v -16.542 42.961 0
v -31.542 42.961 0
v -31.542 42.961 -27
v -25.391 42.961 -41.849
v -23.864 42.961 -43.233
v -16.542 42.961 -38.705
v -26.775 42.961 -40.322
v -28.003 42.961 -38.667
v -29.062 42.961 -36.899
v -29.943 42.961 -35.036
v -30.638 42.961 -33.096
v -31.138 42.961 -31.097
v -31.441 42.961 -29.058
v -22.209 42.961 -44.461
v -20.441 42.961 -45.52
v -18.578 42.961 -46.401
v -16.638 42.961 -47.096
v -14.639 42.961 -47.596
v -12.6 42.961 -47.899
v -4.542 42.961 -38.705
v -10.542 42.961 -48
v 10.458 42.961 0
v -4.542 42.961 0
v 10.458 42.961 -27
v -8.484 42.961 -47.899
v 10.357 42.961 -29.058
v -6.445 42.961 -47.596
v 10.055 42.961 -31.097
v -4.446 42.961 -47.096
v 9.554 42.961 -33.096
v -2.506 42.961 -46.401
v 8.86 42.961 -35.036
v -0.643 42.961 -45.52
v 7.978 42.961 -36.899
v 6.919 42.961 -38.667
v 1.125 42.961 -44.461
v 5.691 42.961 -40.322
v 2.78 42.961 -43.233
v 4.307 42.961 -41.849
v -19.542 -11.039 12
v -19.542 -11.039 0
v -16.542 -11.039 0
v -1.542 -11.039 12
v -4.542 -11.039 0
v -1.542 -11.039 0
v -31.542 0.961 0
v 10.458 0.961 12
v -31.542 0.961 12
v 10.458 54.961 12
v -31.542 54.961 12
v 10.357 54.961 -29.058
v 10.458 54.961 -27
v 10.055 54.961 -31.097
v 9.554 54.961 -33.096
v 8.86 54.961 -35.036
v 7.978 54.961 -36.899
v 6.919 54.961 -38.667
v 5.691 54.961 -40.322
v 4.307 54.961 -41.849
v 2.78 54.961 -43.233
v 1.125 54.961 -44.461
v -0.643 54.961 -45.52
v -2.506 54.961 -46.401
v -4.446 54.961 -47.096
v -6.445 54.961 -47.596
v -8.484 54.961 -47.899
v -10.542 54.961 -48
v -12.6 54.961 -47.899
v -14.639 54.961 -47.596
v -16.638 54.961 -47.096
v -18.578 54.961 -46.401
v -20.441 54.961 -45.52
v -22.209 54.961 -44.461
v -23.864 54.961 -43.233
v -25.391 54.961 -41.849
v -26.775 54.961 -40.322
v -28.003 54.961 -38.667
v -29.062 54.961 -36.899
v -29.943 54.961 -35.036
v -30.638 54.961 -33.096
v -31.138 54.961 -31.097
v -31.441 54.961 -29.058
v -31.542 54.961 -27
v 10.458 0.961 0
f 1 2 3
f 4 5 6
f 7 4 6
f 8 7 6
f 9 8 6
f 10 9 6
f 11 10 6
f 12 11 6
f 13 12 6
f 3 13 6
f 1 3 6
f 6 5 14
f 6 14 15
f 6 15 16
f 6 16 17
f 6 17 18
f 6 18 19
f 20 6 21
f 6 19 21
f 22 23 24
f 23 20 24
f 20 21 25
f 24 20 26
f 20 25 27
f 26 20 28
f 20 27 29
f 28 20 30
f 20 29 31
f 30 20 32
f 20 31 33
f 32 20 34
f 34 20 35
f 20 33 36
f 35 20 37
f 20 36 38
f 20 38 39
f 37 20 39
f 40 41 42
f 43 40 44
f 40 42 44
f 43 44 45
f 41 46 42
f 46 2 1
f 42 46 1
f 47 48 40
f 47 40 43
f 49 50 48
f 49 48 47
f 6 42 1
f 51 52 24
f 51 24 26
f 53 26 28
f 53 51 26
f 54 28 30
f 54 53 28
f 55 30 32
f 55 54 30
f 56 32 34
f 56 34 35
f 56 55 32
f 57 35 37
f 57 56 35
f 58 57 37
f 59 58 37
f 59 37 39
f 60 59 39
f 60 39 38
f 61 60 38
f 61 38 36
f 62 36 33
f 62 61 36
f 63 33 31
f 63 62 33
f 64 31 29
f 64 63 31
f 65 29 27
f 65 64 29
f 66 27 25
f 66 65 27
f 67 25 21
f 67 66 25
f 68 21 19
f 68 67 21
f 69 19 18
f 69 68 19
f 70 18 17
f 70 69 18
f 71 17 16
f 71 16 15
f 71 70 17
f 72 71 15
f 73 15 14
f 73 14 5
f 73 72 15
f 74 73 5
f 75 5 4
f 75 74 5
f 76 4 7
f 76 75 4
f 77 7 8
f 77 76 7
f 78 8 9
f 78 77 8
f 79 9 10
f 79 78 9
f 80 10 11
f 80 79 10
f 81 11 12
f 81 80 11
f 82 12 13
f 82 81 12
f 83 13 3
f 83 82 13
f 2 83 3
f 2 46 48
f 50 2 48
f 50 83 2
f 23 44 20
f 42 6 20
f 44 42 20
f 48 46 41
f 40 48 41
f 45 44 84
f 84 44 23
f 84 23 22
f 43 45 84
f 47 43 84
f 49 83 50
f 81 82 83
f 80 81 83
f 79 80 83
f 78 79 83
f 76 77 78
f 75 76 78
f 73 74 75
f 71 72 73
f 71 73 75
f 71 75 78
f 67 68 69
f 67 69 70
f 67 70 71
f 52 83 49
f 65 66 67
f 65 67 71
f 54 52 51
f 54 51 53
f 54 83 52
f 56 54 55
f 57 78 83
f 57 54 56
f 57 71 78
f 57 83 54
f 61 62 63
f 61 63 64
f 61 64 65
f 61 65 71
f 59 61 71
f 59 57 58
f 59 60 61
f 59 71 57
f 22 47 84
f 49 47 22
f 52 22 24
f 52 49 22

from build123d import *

# Parameters (mm, degrees)
BOSS_EXTRUDE2_DEPTH = 12
BOSS_EXTRUDE4_DEPTH = 12
RIB1_REACH          = 81.189
SKETCH7_WALLS_W     = 12
SKETCH7_WALLS_H     = 226.916782225


with BuildPart() as part:
    # Sketch1 → Boss-Extrude2 (new body)
    with BuildSketch(Plane.XY):
        Polygon((-31.541899517, 54.96059397), (-31.541899517, 0.96059397), (-19.541899517, -11.03940603), (-1.541899517, -11.03940603), (10.458100483, 0.96059397), (10.458100483, 54.96059397), align=None)
    extrude(amount=BOSS_EXTRUDE2_DEPTH)

    # Sketch2 → Boss-Extrude4 (add)
    with BuildSketch(Plane(origin=(0, 54.96059397, 0), x_dir=(1, 0, 0), z_dir=(0, 1, 0))):
        with BuildLine():
            Line((10.458100483, 0), (10.458100483, 27))
            ThreePointArc((10.458100483, 27), (-10.541899517, 48), (-31.541899517, 27))
            Line((-31.541899517, 27), (-31.541899517, 0))
            Line((-31.541899517, 0), (10.458100483, 0))
        make_face()
    extrude(amount=-BOSS_EXTRUDE4_DEPTH)

    # Sketch7 walls → Rib1 (add, up to next)
    with BuildSketch(Plane(origin=(0, -3.746614572, -5.227167373), x_dir=(1, 0, 0), z_dir=(0, 0.5825680402279159, 0.8127819378560314)), mode=Mode.PRIVATE) as rib1_sk1:
        with Locations((-10.541899517, 24.296475579)):
            Rectangle(SKETCH7_WALLS_W, SKETCH7_WALLS_H)
    rib1_tool1 = extrude(rib1_sk1.sketch, amount=RIB1_REACH, mode=Mode.PRIVATE) - part.part
    add(rib1_tool1.solids().sort_by_distance((-10.541899517, 16.001121931, -19.381517535))[0])


solid = part.part
